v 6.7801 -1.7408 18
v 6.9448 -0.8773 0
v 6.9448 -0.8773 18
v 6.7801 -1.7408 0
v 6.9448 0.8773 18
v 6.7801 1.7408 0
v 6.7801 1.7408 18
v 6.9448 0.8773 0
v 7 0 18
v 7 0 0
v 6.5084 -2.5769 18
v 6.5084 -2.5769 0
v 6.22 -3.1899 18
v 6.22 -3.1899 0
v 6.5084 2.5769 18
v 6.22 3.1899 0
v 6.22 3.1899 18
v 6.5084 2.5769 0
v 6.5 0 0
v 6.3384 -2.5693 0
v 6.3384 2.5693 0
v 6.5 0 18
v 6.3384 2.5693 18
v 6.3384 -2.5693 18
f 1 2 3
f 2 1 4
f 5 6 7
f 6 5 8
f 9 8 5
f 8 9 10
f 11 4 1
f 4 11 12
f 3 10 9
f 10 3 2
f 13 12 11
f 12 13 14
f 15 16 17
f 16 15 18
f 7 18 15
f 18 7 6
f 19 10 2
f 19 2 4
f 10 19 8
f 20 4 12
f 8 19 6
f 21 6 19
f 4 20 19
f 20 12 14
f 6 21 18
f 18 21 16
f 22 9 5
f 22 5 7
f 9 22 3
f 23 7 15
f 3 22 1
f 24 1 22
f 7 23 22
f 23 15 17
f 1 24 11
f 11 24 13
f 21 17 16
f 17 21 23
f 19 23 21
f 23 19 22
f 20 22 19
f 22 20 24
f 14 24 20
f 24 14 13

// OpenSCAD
$fn = 50;


difference() {
	union() {
		cylinder(h = 18, r = 7.0000000000);
		translate(v = [-17.0000000000, 0, 0]) {
			cylinder(h = 18, r = 7.0000000000);
		}
	}
	union() {
		cylinder(h = 18, r = 3.2500000000);
		cylinder(h = 18, r = 1.8000000000);
		cylinder(h = 18, r = 1.8000000000);
		cylinder(h = 18, r = 1.8000000000);
		translate(v = [-21.5000000000, 0, 0]) {
			hull() {
				translate(v = [-3.7500000000, 0.0000000000, 0]) {
					cylinder(h = 18, r = 10.5000000000);
				}
				translate(v = [3.7500000000, 0.0000000000, 0]) {
					cylinder(h = 18, r = 10.5000000000);
				}
				translate(v = [-3.7500000000, -0.0000000000, 0]) {
					cylinder(h = 18, r = 10.5000000000);
				}
				translate(v = [3.7500000000, -0.0000000000, 0]) {
					cylinder(h = 18, r = 10.5000000000);
				}
			}
		}
		translate(v = [-14.0000000000, 0, 0.0000000000]) {
			cylinder(h = 18, r = 20.5000000000);
		}
	}
}
